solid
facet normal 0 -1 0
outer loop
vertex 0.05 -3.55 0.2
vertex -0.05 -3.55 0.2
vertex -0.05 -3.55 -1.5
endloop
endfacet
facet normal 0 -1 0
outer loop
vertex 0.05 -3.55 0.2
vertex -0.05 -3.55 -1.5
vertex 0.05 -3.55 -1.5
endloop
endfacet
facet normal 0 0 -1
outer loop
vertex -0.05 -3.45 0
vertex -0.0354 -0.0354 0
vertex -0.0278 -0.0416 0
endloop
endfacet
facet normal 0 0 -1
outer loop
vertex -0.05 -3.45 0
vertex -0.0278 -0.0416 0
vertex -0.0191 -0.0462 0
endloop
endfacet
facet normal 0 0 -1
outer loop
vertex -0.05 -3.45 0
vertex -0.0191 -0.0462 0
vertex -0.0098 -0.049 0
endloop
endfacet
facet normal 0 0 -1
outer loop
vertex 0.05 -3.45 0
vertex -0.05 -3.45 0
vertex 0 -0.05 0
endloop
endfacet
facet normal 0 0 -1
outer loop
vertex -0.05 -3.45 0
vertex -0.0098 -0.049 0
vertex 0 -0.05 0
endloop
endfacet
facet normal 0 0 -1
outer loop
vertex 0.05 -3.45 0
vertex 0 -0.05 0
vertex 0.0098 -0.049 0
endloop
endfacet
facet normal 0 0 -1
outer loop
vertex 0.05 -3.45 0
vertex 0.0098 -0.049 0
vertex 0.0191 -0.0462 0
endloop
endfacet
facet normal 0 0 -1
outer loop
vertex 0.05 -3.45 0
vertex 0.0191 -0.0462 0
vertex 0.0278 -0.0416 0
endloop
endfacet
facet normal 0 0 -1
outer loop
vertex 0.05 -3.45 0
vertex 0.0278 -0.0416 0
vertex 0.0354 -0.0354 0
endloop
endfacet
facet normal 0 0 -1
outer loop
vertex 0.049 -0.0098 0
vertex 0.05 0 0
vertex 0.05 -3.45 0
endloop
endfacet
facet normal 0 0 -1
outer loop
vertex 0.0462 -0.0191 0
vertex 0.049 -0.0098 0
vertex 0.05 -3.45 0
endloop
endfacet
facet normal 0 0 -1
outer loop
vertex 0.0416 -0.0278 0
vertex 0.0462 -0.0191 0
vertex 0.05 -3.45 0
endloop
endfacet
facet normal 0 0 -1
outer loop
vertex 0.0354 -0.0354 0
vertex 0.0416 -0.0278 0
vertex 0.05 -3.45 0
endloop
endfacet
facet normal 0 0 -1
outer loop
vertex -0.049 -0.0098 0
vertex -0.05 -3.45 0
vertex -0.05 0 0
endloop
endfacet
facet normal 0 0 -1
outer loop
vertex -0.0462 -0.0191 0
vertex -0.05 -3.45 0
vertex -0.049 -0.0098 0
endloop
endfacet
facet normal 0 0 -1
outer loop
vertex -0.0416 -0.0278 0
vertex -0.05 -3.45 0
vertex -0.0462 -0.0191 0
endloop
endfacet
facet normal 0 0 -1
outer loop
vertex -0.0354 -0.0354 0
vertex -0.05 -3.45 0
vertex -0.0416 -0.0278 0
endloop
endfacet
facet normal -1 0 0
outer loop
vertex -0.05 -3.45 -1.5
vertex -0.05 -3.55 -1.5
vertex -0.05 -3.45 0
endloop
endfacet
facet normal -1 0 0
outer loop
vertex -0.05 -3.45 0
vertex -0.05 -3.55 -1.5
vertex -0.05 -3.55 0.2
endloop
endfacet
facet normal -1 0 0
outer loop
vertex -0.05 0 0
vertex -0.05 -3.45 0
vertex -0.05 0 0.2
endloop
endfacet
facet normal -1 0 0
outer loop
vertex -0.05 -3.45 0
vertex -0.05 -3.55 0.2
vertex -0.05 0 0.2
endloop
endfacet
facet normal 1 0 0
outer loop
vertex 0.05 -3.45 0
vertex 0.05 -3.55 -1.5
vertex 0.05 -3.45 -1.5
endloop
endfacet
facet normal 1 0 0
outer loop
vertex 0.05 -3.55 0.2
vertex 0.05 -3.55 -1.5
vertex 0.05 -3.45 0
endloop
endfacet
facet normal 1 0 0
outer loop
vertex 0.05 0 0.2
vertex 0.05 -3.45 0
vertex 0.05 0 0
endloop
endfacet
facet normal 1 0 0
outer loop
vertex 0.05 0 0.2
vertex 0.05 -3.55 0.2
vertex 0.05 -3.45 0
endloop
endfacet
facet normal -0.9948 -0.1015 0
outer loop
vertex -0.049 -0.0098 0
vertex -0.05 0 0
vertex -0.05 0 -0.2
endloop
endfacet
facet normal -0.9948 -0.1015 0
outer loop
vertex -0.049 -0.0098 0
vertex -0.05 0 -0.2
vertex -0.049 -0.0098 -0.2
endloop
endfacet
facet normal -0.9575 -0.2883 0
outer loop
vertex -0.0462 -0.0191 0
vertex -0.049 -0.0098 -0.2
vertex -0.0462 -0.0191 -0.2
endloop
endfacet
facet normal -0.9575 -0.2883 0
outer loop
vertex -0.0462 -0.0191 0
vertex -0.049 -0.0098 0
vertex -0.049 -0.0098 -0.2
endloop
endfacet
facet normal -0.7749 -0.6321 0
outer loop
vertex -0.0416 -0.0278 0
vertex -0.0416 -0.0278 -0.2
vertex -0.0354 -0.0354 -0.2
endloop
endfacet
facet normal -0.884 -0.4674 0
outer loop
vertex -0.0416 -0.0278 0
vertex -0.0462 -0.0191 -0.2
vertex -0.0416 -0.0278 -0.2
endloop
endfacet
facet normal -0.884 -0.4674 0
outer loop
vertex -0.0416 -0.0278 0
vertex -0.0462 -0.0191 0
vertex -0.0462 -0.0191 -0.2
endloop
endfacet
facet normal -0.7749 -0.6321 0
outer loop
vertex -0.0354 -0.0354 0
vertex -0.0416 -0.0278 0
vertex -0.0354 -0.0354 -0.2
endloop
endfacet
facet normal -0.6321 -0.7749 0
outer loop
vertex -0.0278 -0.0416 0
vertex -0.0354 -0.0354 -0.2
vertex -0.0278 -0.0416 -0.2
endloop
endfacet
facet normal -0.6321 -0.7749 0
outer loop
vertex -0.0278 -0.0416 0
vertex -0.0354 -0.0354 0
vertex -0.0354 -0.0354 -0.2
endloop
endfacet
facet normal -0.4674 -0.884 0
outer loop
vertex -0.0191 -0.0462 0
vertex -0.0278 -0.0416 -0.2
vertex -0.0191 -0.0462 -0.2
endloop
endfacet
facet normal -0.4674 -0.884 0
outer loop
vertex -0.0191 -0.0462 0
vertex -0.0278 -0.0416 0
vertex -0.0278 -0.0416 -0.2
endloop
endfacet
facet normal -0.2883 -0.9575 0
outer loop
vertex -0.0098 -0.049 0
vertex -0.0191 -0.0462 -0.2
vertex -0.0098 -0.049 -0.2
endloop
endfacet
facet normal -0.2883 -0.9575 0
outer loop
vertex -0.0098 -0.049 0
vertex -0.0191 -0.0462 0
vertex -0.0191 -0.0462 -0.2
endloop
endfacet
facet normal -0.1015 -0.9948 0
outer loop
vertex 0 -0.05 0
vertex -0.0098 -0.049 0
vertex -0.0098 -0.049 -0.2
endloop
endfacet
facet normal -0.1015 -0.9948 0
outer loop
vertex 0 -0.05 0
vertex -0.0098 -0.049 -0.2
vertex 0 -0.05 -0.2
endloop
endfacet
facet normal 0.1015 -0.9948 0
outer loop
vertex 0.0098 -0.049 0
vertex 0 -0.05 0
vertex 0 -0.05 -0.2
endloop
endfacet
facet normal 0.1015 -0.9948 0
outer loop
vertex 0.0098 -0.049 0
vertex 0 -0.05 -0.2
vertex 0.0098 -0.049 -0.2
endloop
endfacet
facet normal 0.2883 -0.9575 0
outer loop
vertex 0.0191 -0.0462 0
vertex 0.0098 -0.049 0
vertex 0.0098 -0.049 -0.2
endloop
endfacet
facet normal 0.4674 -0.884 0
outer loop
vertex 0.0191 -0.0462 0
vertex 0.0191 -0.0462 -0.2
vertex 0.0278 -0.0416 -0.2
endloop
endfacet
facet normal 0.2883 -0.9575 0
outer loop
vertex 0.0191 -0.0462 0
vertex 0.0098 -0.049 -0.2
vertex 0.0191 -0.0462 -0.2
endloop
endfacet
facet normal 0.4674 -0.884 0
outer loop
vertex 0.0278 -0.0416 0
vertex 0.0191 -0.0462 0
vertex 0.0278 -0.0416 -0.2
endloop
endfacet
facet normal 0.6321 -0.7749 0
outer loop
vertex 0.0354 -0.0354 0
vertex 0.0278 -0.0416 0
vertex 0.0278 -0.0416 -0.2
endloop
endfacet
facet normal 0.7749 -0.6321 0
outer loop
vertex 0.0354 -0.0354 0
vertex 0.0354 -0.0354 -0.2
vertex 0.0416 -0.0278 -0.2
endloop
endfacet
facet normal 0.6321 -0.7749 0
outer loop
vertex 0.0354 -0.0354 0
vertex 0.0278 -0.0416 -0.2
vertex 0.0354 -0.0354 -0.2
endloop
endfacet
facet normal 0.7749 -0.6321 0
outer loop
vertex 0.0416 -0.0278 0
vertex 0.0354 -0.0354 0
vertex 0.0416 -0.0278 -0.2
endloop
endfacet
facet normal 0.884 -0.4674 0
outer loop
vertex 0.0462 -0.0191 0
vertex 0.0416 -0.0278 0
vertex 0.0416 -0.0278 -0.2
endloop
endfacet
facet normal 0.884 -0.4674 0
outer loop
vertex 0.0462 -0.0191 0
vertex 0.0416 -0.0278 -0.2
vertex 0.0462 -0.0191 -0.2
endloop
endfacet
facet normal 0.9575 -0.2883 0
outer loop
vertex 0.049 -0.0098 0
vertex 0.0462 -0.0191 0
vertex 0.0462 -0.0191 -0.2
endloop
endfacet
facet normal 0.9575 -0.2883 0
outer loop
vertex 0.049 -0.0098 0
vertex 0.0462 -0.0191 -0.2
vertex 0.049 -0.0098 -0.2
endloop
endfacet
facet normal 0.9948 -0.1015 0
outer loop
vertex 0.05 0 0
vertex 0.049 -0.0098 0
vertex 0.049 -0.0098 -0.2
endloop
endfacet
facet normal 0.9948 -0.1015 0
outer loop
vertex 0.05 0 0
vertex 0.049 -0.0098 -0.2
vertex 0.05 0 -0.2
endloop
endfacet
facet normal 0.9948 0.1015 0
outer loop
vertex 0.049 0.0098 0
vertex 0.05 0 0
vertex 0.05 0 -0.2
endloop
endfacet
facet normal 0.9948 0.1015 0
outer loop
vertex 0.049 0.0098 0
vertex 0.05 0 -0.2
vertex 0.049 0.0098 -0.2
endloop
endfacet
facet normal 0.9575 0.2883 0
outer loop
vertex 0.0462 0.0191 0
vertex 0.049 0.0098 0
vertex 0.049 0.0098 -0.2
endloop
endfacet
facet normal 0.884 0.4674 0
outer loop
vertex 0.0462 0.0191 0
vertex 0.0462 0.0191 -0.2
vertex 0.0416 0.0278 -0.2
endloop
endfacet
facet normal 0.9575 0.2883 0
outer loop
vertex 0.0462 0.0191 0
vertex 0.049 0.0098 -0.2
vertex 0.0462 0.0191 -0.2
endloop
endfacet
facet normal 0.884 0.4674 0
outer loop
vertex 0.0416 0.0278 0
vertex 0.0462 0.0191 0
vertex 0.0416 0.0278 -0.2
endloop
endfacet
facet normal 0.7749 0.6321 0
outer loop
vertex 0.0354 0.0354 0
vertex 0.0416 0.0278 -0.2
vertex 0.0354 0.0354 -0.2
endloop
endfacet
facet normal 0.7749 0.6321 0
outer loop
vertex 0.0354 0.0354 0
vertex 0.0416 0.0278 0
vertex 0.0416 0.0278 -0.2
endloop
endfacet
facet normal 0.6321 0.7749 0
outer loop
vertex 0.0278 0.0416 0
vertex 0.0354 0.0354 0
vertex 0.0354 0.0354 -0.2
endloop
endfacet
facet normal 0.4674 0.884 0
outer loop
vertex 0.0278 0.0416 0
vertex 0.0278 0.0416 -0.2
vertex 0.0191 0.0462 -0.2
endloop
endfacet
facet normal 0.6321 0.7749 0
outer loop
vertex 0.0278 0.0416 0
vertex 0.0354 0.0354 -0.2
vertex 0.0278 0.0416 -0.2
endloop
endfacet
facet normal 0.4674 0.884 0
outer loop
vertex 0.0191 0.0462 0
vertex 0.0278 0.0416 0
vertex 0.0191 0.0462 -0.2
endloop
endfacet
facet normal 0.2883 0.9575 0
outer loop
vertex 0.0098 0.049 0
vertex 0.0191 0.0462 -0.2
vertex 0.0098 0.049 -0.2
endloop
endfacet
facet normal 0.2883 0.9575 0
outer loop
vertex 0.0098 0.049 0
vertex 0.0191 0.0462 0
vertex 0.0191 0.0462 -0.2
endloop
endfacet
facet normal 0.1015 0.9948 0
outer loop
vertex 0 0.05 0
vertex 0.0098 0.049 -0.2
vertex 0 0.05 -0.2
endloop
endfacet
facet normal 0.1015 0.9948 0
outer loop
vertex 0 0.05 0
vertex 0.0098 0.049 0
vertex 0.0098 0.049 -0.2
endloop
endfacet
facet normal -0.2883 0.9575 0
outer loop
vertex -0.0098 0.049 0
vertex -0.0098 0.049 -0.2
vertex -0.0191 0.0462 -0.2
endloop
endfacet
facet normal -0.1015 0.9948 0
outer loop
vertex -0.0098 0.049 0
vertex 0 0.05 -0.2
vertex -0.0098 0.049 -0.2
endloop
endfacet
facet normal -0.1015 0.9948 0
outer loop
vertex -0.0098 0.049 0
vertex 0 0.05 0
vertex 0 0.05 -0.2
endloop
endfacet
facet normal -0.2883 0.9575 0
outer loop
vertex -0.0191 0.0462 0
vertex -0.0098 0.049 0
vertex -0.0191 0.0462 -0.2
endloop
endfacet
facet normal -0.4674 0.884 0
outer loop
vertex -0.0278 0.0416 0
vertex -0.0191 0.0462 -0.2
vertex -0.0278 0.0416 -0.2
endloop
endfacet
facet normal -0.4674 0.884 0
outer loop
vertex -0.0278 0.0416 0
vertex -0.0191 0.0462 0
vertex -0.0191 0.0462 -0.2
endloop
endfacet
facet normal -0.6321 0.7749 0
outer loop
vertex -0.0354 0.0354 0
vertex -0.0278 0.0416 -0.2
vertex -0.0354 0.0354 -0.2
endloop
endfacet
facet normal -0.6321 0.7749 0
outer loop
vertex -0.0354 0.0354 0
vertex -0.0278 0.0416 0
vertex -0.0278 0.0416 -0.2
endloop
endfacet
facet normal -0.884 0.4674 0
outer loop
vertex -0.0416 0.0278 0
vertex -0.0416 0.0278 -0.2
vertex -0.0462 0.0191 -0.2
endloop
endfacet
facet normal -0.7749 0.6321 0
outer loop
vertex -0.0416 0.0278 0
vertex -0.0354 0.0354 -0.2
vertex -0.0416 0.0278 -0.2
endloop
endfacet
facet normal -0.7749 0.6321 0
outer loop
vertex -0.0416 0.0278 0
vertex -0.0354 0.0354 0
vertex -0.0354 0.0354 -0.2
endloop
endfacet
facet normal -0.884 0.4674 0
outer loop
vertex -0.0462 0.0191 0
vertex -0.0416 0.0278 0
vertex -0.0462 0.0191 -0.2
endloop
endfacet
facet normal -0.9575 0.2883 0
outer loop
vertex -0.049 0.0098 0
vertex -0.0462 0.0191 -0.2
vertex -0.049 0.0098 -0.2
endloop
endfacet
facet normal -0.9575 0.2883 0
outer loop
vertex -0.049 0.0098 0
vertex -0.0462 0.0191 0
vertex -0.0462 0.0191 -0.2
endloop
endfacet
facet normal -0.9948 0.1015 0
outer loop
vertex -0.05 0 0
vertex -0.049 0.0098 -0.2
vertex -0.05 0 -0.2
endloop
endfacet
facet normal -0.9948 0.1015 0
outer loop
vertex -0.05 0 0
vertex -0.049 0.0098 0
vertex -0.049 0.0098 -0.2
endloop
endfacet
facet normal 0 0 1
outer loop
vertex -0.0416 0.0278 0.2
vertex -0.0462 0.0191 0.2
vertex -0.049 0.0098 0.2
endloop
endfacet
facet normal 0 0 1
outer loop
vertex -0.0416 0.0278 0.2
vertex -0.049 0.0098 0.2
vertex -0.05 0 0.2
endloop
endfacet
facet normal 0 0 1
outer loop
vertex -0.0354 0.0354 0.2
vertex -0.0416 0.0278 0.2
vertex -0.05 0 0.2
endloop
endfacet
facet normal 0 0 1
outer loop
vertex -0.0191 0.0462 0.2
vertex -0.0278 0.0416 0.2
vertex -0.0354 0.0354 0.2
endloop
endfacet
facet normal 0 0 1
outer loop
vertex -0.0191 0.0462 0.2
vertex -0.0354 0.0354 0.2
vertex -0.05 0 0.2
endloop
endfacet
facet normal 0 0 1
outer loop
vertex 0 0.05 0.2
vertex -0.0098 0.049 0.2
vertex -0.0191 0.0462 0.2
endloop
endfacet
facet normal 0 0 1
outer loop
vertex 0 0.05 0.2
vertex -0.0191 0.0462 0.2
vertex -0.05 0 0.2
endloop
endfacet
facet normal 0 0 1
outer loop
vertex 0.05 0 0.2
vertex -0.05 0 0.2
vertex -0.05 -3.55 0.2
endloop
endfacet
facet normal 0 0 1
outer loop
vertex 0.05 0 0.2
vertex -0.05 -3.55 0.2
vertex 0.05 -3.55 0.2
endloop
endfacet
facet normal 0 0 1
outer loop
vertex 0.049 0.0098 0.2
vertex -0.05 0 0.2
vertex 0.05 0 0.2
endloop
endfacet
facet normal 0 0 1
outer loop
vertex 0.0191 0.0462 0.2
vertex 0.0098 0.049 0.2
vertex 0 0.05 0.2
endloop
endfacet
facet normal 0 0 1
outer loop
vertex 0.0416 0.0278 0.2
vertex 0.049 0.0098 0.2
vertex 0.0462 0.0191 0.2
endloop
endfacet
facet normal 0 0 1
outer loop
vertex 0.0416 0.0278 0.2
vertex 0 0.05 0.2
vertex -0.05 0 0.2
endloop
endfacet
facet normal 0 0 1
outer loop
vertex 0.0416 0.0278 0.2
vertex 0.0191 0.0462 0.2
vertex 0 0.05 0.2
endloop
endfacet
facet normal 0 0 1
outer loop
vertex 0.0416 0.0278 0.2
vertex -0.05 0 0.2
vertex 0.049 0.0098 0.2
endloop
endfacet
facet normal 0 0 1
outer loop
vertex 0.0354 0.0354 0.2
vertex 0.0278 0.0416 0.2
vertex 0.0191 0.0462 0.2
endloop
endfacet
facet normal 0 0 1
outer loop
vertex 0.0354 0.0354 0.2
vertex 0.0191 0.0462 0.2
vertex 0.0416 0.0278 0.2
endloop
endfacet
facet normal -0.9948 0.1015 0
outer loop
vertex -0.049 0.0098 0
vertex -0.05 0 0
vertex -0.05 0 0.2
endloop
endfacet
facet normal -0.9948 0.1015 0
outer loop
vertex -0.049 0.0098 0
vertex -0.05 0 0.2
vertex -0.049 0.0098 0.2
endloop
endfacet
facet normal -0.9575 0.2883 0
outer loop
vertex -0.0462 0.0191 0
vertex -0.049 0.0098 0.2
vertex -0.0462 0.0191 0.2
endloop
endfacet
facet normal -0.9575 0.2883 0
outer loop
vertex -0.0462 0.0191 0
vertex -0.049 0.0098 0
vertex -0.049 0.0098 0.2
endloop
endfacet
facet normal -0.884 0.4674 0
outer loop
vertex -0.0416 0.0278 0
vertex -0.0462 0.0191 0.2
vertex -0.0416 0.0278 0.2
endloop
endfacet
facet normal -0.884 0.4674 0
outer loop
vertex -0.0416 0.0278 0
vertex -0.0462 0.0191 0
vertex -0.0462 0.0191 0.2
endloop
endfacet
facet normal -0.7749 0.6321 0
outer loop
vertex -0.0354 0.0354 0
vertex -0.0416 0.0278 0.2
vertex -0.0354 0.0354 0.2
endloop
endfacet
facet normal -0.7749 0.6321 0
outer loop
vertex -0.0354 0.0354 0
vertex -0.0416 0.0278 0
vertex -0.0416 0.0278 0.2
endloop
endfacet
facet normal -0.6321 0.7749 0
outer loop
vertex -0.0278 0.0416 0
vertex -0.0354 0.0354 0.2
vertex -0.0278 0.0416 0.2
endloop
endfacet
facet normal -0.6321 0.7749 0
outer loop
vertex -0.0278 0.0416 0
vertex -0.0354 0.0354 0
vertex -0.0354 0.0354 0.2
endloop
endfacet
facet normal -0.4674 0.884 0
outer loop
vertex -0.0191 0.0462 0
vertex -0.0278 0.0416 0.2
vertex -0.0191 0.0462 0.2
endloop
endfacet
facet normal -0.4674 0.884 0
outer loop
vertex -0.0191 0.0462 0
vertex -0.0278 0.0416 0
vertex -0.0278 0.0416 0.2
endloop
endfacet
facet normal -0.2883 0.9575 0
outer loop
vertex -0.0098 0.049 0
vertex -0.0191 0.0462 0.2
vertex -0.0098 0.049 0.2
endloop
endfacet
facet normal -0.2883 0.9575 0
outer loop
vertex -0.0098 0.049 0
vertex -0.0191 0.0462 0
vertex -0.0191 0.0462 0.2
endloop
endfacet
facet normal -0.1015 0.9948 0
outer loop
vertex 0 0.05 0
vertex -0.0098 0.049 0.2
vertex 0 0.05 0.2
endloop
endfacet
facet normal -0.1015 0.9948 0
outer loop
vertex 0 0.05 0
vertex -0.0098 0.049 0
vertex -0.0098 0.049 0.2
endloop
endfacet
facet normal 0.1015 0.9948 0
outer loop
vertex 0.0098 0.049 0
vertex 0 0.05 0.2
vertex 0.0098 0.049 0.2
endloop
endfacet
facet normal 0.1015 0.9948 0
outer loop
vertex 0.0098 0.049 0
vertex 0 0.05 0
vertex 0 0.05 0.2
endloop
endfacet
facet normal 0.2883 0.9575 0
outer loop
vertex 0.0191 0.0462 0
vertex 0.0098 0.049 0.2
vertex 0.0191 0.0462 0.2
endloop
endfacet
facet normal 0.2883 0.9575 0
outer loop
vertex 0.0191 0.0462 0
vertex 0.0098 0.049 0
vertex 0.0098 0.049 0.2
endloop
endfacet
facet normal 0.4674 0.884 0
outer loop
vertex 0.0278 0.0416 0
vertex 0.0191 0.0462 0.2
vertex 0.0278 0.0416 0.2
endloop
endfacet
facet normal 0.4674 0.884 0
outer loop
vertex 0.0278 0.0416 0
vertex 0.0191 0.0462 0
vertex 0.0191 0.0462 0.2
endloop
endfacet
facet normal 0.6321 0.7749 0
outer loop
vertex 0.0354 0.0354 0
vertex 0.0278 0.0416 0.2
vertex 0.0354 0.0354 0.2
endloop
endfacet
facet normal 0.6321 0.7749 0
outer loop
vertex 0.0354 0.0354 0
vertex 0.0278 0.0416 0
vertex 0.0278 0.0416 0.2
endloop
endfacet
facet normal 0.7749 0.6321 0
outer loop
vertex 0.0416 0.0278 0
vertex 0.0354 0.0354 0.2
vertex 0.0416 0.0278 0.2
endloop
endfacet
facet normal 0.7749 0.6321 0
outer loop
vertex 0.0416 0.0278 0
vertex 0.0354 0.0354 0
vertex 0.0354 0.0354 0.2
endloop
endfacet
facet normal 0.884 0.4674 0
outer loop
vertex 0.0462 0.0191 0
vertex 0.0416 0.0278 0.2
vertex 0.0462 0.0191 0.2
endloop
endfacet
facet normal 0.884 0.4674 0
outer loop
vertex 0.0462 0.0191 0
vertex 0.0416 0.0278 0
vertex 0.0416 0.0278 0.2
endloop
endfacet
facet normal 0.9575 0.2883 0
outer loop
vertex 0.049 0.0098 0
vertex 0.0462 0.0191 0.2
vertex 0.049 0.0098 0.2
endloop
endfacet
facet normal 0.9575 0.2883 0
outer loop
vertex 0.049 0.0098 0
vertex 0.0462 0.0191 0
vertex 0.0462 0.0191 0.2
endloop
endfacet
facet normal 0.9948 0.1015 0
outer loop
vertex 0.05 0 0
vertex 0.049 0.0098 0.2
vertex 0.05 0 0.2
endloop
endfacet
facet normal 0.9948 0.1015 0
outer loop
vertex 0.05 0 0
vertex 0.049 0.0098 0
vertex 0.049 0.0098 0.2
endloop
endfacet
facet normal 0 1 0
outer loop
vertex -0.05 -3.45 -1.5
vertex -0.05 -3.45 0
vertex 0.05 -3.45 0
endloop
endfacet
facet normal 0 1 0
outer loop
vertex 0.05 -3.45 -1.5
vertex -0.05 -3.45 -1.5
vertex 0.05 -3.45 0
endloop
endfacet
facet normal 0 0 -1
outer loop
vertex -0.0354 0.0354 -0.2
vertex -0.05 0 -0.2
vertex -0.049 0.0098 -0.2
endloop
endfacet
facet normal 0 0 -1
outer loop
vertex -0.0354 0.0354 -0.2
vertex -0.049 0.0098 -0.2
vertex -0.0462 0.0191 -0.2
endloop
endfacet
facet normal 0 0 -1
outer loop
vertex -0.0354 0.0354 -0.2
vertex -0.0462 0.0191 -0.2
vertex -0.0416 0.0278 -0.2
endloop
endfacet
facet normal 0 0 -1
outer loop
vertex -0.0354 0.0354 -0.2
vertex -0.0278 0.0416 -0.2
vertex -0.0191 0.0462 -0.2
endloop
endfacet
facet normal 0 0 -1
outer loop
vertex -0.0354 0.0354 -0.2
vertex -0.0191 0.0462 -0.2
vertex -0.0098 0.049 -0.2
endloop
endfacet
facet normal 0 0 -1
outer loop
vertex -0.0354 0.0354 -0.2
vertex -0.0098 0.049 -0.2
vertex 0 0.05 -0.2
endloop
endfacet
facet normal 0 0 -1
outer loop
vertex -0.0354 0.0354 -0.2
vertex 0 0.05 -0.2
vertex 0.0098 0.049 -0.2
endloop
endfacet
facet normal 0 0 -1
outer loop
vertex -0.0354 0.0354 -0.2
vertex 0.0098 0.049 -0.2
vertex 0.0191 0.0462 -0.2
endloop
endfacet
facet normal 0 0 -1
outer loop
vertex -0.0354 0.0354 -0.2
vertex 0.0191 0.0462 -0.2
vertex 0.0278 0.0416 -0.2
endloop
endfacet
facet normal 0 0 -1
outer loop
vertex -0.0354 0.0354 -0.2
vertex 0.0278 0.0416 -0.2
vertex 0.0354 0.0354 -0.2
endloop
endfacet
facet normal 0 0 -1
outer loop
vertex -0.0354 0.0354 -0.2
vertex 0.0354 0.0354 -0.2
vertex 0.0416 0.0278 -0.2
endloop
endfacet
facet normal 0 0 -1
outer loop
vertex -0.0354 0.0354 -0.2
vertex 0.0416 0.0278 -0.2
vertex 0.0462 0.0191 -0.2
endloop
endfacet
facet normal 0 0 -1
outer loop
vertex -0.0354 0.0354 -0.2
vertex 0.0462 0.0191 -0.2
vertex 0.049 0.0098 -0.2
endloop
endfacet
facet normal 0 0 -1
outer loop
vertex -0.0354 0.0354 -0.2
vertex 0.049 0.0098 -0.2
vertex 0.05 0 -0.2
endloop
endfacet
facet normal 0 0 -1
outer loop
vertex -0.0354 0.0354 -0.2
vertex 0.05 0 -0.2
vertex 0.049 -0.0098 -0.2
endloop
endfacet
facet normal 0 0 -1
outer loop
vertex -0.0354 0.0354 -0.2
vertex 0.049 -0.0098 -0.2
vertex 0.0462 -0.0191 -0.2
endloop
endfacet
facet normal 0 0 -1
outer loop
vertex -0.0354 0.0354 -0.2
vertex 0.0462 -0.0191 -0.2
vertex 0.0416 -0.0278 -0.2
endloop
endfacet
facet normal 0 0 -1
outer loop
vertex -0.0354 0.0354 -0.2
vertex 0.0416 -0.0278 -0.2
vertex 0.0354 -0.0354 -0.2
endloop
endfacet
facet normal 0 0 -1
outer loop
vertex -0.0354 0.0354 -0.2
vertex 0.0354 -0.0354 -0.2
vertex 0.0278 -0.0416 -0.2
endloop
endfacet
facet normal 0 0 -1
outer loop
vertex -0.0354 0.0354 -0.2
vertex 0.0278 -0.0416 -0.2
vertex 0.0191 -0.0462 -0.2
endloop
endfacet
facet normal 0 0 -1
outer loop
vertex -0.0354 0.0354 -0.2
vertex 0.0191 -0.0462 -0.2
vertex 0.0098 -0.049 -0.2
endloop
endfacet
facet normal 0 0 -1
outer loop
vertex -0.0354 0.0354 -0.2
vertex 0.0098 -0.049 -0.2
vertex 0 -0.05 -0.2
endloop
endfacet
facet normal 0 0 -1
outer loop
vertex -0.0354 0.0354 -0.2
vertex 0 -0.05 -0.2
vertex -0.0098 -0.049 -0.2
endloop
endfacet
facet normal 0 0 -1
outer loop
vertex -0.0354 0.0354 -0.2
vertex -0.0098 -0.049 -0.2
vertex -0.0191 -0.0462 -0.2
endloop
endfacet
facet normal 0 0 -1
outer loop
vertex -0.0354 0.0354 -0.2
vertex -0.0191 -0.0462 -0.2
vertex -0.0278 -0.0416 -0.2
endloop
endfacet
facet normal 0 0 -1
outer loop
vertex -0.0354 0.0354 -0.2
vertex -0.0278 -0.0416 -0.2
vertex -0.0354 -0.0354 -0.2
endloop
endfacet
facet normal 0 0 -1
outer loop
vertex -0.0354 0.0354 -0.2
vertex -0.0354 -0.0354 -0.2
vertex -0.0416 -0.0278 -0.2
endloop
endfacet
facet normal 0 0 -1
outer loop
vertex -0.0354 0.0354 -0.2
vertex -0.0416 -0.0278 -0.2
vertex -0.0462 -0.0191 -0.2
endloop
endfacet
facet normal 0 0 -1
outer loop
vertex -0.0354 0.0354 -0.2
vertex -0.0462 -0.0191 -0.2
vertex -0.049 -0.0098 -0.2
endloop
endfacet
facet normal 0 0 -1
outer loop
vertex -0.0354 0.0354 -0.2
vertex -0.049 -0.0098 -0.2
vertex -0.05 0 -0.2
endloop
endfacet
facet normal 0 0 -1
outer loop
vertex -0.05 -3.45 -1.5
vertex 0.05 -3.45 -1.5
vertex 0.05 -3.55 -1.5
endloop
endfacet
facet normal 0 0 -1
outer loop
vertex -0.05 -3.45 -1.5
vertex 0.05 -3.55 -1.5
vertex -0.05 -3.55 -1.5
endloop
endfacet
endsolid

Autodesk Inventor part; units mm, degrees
ref_plane "YZ Plane" through (0, 0, 0) normal (1, 0, 0) x (0, 1, 0)
ref_plane "XZ Plane" through (0, 0, 0) normal (0, 1, 0) x (-1, 0, 0)
ref_plane "XY Plane" through (0, 0, 0) normal (0, 0, 1) x (1, 0, 0)
sketch "Sketch1" plane through (0, 0, 0) normal (0, 0, 1) x (1, 0, 0)
  circle A0 centre (0, 0) radius 0.05
  line L0 (0, 0) -> (0, -3.5)
  line L1 (-0.05, -3.55) -> (0.05, -3.55)
  line L2 (0.05, -3.55) -> (0.05, -3.45)
  line L3 (0.05, -3.45) -> (-0.05, -3.45)
  line L4 (-0.05, -3.45) -> (-0.05, -3.55)
  line L5 (-0.05, -3.55) -> (0.05, -3.45) construction
  line L6 (0.05, -3.55) -> (-0.05, -3.45) construction
  line L7 (0.05, -3.45) -> (0.05, 0)
  line L8 (-0.05, -3.45) -> (-0.05, 0)
  dimension "d0" = 0.1
  dimension "d1" = 3.5
  dimension "d2" = 0.1
  dimension "d3" = 0.1
extrude "Extrusion1" add sketch "Sketch1" along normal blind 0.2
sketch "Sketch2" plane through (0, 0, 0) normal (0, 0, -1) x (-1, 0, 0)
  circle A0 centre (0, 0) radius 0.05
  dimension "d6" = 0.1
extrude "Extrusion2" add sketch "Sketch2" along normal blind 0.2
sketch "Sketch3" plane through (0, 0, 0) normal (0, 0, -1) x (-1, 0, 0)
  line L0 (0.05, -3.55) -> (-0.05, -3.55) projected
  line L1 (-0.05, -3.55) -> (0.05, -3.55)
  line L2 (0.05, -3.55) -> (0.05, -3.45)
  line L3 (0.05, 0) -> (0.05, -3.55) projected
  line L4 (0.05, -3.45) -> (-0.05, -3.45)
  line L5 (-0.05, -3.55) -> (-0.05, 0) projected
  line L6 (-0.05, -3.45) -> (-0.05, -3.55)
  point P0 (0, 0)
  dimension "d9" = 0.1
extrude "Extrusion3" add sketch "Sketch3" along normal blind 1.5
properties part number "Bone15_14_Fix"
